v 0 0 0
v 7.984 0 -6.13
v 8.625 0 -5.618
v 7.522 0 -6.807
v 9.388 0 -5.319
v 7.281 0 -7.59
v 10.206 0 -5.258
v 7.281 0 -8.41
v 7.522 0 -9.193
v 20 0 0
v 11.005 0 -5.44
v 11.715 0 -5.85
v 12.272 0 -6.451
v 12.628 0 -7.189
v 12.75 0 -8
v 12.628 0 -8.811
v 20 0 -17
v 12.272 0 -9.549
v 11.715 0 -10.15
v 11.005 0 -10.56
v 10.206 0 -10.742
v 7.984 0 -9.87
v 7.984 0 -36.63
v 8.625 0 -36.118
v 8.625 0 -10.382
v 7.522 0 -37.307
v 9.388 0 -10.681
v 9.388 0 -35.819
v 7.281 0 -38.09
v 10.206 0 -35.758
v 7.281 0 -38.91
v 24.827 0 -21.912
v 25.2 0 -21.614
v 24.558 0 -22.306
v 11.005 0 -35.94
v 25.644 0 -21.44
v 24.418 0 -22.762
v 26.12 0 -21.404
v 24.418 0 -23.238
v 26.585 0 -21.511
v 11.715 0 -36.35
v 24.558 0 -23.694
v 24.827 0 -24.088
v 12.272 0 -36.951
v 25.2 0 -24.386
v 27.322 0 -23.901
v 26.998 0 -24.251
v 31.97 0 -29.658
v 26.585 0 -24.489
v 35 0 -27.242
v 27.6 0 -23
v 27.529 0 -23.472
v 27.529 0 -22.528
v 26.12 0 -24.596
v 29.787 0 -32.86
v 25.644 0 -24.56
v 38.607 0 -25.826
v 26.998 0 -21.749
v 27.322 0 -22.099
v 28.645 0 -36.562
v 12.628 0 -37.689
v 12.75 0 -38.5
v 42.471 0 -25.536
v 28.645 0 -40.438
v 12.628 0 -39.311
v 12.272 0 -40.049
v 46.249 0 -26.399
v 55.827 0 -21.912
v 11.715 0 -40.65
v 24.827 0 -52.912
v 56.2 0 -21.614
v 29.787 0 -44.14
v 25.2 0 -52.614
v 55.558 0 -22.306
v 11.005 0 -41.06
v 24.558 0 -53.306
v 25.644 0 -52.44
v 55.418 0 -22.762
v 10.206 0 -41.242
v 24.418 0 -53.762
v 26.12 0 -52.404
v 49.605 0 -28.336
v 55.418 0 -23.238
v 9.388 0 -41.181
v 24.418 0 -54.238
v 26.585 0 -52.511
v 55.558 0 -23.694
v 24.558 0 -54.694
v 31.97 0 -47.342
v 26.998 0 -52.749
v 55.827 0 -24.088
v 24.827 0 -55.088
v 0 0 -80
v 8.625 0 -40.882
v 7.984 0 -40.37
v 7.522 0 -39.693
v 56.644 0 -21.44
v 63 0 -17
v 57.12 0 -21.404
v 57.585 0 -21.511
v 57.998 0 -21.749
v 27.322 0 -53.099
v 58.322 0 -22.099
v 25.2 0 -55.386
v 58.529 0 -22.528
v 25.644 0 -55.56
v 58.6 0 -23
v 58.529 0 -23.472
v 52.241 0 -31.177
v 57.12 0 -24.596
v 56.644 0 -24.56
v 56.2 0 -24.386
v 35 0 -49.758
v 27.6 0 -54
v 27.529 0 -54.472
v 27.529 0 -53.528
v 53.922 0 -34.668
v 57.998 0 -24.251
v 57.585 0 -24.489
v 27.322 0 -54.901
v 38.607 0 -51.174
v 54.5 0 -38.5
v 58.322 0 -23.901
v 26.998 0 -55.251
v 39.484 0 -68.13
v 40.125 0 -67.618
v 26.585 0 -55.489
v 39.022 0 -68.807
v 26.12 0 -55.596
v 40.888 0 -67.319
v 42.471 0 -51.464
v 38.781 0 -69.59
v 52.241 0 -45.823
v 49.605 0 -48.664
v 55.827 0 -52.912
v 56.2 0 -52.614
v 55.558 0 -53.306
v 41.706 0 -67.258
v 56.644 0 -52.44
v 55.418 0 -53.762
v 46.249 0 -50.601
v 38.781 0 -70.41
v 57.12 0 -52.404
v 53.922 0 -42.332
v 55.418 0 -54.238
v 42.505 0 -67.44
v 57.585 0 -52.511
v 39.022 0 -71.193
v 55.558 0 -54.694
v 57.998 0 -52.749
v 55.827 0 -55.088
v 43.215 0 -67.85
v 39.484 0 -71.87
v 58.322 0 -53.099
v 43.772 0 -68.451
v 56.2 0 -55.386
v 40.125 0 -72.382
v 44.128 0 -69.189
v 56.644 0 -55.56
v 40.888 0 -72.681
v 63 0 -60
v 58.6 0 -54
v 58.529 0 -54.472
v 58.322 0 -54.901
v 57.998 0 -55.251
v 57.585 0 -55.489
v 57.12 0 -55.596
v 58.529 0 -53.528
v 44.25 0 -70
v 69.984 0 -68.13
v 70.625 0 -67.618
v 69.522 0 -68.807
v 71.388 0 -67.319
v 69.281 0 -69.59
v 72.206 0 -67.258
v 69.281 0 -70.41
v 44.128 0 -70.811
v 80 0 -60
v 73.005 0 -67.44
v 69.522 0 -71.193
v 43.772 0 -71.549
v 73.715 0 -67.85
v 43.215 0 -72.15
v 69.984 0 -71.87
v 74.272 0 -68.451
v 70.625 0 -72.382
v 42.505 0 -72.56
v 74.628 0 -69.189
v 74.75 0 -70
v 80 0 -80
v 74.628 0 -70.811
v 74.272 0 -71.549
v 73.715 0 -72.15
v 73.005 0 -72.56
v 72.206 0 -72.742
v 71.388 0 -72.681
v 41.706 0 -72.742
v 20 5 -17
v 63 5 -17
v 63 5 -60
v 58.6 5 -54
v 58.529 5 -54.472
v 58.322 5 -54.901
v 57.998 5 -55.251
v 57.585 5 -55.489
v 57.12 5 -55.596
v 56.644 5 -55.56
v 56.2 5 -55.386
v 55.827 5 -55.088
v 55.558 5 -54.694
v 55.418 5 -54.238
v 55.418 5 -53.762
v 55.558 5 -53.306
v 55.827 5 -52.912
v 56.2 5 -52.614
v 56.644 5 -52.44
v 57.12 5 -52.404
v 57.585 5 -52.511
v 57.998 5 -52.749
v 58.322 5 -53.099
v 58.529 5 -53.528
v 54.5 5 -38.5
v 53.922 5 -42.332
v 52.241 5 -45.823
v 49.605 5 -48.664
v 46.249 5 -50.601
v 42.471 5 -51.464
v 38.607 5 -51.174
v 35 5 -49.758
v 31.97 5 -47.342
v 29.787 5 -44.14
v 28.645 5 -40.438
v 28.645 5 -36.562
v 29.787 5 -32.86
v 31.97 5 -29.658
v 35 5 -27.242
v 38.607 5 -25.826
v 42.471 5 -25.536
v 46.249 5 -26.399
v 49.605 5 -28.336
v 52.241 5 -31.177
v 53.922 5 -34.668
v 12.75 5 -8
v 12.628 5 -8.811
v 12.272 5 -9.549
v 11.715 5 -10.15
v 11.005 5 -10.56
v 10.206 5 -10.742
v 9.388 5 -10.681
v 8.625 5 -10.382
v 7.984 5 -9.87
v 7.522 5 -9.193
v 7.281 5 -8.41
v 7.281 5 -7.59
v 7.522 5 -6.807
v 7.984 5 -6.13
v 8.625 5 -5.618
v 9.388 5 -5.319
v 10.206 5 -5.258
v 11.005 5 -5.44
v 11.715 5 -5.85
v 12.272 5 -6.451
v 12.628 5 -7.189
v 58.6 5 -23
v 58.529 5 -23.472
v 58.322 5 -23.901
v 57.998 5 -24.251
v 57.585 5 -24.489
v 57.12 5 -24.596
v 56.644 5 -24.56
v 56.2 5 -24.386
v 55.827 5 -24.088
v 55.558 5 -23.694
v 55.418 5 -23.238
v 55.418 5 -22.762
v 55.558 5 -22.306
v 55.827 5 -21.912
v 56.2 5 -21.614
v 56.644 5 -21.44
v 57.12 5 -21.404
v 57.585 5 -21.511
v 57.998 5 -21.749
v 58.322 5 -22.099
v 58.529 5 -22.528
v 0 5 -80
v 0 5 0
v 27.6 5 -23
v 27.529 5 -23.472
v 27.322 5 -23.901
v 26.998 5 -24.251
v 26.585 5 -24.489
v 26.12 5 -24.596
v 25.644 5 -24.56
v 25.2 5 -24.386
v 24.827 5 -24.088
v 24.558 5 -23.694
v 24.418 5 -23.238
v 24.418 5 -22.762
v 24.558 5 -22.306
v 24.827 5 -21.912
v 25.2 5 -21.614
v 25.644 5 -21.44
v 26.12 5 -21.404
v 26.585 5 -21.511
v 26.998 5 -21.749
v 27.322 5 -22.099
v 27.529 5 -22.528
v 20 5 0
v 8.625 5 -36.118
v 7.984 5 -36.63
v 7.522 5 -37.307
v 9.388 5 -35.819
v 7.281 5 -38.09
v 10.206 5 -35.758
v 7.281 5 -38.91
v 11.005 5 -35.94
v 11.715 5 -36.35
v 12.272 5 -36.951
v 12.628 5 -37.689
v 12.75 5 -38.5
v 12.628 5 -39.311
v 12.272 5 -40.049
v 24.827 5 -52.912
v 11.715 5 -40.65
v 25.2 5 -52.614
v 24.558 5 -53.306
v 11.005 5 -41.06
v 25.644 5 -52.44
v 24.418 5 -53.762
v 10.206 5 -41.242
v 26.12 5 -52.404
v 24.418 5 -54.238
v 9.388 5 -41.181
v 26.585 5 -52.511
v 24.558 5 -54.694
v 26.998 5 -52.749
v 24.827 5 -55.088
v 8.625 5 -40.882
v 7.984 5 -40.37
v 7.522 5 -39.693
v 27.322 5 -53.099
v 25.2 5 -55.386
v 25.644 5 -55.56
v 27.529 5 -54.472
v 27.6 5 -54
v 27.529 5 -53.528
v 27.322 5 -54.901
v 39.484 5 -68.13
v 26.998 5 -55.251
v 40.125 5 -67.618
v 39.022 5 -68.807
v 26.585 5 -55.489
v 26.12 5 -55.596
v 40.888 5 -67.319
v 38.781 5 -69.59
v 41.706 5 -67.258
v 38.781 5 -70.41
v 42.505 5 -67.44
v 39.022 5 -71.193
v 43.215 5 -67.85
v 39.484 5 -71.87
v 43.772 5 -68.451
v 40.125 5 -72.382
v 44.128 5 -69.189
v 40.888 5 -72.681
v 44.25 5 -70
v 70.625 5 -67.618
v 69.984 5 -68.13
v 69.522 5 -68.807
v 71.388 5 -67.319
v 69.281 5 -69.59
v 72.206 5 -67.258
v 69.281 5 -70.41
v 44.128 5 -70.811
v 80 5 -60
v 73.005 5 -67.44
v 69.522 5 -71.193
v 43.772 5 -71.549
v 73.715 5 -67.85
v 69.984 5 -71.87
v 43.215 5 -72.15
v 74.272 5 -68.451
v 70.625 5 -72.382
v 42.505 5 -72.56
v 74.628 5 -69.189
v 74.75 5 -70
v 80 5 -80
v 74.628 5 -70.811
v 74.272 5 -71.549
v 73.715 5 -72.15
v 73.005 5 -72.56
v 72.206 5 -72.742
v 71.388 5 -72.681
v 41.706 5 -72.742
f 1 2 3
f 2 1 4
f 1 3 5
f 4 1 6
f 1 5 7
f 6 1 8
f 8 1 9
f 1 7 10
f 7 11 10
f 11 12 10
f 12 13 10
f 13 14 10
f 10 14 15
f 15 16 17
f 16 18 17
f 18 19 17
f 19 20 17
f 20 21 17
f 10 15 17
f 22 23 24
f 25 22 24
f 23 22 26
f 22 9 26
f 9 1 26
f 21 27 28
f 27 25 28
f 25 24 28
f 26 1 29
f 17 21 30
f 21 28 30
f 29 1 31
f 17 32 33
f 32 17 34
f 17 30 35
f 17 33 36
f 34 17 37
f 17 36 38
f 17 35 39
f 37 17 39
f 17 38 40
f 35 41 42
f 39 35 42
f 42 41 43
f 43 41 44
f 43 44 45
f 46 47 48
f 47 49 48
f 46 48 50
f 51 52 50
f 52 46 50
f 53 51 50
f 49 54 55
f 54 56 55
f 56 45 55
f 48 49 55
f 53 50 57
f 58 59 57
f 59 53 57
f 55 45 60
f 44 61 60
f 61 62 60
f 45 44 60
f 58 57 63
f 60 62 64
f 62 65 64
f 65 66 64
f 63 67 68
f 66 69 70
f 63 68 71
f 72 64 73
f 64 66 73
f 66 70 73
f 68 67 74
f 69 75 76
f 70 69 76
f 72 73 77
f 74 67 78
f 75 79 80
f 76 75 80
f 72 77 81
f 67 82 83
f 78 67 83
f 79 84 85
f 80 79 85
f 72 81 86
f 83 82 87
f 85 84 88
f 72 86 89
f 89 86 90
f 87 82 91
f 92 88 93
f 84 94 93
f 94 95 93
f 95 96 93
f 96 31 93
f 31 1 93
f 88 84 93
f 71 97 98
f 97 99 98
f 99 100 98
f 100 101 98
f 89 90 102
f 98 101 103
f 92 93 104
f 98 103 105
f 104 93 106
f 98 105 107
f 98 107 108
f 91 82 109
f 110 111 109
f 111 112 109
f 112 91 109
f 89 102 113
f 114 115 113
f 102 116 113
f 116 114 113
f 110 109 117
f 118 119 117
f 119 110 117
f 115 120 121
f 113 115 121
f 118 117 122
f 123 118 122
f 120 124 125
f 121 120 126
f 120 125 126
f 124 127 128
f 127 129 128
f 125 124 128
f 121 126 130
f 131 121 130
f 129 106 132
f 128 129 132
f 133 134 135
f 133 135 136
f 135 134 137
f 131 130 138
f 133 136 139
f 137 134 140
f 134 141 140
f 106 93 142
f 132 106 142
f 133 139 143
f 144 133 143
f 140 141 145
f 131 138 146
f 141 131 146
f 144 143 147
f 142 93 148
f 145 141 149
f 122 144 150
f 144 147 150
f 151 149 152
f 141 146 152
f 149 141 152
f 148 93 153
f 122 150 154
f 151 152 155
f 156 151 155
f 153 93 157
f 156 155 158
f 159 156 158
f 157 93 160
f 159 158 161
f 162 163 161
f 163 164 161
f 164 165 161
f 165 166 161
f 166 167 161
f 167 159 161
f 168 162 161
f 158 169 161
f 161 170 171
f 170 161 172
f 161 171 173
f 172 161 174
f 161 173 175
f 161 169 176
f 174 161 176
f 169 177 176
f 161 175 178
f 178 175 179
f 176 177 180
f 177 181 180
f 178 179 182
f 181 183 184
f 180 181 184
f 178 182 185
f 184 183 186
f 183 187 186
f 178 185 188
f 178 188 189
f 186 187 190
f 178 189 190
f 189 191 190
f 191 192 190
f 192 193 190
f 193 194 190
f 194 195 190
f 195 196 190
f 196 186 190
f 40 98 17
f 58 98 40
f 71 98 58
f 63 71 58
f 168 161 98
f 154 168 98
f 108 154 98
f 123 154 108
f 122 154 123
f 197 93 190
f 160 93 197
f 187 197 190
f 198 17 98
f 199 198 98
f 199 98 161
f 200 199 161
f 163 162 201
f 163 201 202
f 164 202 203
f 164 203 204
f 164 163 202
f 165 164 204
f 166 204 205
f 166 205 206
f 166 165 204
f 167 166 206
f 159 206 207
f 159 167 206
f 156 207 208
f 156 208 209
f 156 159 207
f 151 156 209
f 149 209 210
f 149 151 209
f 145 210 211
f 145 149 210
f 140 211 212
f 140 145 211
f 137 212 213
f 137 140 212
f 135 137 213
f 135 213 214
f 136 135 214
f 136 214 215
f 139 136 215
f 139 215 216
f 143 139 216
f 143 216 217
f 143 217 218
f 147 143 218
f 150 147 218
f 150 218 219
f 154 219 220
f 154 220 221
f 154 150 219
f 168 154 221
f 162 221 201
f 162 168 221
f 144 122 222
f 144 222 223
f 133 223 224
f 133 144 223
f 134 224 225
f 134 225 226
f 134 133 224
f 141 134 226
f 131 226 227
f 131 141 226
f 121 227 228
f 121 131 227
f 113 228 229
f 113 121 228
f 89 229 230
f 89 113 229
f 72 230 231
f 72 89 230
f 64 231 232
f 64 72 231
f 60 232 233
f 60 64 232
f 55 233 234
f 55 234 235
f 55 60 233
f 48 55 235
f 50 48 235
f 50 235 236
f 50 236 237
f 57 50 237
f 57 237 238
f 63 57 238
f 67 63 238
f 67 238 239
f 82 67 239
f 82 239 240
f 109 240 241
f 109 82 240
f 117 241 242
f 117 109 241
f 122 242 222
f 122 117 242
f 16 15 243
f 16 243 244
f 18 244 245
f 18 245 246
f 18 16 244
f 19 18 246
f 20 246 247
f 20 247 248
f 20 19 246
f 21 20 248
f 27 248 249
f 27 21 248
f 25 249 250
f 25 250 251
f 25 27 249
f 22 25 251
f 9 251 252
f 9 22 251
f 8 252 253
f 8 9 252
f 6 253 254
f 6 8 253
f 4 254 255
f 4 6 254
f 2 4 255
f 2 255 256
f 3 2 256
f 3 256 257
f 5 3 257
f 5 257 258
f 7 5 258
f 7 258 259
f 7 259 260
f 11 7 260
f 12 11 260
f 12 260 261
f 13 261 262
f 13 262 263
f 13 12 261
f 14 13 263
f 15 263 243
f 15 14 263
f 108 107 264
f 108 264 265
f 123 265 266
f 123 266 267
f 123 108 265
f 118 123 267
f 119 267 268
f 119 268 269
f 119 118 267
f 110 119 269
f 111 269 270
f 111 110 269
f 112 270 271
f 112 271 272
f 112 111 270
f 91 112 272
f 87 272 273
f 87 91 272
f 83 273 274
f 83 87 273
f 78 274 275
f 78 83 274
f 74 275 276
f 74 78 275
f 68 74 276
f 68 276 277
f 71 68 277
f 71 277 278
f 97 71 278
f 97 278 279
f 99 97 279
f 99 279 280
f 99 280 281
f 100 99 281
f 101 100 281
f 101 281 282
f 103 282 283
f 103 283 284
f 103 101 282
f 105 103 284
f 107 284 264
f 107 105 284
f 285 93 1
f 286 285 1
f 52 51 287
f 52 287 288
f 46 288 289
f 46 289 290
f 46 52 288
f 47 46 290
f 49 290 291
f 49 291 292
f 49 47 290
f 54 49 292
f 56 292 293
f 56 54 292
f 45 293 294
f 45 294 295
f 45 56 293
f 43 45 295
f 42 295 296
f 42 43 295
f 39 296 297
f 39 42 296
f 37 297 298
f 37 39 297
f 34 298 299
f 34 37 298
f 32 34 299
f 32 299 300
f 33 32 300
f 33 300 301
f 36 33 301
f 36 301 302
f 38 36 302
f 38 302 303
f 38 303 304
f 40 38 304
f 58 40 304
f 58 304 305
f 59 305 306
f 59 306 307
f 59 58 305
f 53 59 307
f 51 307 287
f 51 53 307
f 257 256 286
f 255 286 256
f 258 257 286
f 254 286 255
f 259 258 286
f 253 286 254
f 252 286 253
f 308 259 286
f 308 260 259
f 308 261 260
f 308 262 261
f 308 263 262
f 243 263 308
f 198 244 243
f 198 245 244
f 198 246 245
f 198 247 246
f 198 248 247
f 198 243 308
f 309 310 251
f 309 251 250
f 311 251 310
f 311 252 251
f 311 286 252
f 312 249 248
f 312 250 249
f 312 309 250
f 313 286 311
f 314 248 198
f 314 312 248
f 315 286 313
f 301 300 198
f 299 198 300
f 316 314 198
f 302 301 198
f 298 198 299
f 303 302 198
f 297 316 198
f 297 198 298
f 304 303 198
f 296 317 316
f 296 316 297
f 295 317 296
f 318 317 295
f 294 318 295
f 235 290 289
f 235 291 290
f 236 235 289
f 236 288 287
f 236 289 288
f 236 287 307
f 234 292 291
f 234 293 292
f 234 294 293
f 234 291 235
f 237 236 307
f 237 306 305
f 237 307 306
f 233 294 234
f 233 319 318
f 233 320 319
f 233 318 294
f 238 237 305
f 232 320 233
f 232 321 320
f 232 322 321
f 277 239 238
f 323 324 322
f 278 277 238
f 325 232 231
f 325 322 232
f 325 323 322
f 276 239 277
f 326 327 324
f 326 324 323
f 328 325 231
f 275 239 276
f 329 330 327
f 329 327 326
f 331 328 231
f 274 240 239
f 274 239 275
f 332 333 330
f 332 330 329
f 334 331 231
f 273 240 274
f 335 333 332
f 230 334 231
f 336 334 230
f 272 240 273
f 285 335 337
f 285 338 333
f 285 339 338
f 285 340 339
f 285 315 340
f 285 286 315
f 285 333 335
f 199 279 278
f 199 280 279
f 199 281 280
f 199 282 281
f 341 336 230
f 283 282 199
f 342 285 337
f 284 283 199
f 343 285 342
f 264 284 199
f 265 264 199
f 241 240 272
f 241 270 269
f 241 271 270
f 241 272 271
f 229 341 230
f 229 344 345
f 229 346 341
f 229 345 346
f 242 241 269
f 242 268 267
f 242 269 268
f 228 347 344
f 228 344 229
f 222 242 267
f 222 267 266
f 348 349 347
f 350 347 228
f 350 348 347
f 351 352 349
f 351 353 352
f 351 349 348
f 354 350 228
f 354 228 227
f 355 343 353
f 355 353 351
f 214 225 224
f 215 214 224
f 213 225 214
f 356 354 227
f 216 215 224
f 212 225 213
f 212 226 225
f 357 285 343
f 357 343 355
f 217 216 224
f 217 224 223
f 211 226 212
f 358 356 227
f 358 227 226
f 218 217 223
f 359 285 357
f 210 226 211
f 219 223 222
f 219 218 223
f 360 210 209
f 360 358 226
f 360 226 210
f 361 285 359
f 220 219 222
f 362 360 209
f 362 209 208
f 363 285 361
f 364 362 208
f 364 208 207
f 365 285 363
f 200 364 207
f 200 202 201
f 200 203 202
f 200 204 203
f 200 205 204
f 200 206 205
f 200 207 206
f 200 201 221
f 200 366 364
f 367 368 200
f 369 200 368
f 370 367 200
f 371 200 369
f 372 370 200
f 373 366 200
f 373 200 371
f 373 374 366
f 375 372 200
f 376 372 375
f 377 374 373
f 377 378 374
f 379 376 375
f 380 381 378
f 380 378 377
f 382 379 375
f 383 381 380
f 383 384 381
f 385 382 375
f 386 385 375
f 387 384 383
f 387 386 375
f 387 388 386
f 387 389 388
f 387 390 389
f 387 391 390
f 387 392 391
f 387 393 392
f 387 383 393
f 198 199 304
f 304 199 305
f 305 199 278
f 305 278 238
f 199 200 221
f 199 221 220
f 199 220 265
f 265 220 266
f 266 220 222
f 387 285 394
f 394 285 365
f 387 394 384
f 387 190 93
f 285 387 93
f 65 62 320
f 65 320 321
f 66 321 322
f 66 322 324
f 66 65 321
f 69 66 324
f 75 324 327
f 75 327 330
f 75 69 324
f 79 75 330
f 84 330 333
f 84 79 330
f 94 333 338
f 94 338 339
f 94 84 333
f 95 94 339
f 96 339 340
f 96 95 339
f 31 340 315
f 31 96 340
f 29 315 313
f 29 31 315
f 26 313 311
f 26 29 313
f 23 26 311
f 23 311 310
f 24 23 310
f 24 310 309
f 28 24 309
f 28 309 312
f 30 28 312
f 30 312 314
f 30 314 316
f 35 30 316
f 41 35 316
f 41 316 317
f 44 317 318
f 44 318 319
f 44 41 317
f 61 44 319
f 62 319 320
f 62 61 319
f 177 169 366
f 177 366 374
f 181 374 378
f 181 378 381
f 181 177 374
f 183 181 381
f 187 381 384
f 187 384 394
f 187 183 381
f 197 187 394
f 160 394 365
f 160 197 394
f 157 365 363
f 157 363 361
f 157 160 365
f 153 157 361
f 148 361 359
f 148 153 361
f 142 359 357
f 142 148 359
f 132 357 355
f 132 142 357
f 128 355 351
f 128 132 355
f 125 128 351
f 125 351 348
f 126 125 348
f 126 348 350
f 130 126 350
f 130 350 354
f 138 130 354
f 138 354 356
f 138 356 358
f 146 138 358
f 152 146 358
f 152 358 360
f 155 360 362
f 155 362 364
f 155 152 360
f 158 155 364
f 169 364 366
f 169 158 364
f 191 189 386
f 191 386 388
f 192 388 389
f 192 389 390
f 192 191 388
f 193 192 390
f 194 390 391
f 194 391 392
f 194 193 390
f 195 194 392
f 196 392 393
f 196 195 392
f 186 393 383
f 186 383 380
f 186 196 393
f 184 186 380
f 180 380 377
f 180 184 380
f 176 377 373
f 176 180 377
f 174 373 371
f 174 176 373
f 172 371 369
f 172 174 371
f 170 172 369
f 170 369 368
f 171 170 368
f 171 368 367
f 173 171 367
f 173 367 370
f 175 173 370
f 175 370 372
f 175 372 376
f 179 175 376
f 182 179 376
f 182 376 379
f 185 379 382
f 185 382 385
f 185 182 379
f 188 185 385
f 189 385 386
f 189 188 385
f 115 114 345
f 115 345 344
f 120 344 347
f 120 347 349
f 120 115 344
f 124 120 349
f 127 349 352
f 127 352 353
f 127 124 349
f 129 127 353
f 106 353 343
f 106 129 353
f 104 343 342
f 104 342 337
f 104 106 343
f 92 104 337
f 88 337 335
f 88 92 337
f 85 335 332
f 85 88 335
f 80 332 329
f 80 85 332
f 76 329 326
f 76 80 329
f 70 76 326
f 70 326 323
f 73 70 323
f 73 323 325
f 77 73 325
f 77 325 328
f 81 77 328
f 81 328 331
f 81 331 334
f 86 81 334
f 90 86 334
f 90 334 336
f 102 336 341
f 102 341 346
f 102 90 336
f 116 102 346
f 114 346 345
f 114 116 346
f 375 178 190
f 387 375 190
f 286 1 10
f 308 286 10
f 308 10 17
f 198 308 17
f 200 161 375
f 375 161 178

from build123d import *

# Parameters (mm, degrees)
SKETCH2_R           = 1.6
SKETCH2_R_2         = 13
SKETCH2_R_3         = 2.75
BOSS_EXTRUDE1_DEPTH = 5


with BuildPart() as part:
    # Sketch2 → Boss-Extrude1 (new body)
    with BuildSketch(Plane(origin=(0, 0, 0), x_dir=(1, 0, 0), z_dir=(0, 1, 0))):
        Polygon((0, 0), (20, 0), (20, 17), (63, 17), (63, 60), (80, 60), (80, 80), (0, 80), align=None)
        with Locations((57, 23)):
            Circle(SKETCH2_R, mode=Mode.SUBTRACT)
        with Locations((57, 54)):
            Circle(SKETCH2_R, mode=Mode.SUBTRACT)
        with Locations((26, 23)):
            Circle(SKETCH2_R, mode=Mode.SUBTRACT)
        with Locations((26, 54)):
            Circle(SKETCH2_R, mode=Mode.SUBTRACT)
        with Locations((41.5, 38.5)):
            Circle(SKETCH2_R_2, mode=Mode.SUBTRACT)
        with Locations((10, 8)):
            Circle(SKETCH2_R_3, mode=Mode.SUBTRACT)
        with Locations((72, 70)):
            Circle(SKETCH2_R_3, mode=Mode.SUBTRACT)
        with Locations((41.5, 70)):
            Circle(SKETCH2_R_3, mode=Mode.SUBTRACT)
        with Locations((10, 38.5)):
            Circle(SKETCH2_R_3, mode=Mode.SUBTRACT)
    extrude(amount=BOSS_EXTRUDE1_DEPTH)


solid = part.part
